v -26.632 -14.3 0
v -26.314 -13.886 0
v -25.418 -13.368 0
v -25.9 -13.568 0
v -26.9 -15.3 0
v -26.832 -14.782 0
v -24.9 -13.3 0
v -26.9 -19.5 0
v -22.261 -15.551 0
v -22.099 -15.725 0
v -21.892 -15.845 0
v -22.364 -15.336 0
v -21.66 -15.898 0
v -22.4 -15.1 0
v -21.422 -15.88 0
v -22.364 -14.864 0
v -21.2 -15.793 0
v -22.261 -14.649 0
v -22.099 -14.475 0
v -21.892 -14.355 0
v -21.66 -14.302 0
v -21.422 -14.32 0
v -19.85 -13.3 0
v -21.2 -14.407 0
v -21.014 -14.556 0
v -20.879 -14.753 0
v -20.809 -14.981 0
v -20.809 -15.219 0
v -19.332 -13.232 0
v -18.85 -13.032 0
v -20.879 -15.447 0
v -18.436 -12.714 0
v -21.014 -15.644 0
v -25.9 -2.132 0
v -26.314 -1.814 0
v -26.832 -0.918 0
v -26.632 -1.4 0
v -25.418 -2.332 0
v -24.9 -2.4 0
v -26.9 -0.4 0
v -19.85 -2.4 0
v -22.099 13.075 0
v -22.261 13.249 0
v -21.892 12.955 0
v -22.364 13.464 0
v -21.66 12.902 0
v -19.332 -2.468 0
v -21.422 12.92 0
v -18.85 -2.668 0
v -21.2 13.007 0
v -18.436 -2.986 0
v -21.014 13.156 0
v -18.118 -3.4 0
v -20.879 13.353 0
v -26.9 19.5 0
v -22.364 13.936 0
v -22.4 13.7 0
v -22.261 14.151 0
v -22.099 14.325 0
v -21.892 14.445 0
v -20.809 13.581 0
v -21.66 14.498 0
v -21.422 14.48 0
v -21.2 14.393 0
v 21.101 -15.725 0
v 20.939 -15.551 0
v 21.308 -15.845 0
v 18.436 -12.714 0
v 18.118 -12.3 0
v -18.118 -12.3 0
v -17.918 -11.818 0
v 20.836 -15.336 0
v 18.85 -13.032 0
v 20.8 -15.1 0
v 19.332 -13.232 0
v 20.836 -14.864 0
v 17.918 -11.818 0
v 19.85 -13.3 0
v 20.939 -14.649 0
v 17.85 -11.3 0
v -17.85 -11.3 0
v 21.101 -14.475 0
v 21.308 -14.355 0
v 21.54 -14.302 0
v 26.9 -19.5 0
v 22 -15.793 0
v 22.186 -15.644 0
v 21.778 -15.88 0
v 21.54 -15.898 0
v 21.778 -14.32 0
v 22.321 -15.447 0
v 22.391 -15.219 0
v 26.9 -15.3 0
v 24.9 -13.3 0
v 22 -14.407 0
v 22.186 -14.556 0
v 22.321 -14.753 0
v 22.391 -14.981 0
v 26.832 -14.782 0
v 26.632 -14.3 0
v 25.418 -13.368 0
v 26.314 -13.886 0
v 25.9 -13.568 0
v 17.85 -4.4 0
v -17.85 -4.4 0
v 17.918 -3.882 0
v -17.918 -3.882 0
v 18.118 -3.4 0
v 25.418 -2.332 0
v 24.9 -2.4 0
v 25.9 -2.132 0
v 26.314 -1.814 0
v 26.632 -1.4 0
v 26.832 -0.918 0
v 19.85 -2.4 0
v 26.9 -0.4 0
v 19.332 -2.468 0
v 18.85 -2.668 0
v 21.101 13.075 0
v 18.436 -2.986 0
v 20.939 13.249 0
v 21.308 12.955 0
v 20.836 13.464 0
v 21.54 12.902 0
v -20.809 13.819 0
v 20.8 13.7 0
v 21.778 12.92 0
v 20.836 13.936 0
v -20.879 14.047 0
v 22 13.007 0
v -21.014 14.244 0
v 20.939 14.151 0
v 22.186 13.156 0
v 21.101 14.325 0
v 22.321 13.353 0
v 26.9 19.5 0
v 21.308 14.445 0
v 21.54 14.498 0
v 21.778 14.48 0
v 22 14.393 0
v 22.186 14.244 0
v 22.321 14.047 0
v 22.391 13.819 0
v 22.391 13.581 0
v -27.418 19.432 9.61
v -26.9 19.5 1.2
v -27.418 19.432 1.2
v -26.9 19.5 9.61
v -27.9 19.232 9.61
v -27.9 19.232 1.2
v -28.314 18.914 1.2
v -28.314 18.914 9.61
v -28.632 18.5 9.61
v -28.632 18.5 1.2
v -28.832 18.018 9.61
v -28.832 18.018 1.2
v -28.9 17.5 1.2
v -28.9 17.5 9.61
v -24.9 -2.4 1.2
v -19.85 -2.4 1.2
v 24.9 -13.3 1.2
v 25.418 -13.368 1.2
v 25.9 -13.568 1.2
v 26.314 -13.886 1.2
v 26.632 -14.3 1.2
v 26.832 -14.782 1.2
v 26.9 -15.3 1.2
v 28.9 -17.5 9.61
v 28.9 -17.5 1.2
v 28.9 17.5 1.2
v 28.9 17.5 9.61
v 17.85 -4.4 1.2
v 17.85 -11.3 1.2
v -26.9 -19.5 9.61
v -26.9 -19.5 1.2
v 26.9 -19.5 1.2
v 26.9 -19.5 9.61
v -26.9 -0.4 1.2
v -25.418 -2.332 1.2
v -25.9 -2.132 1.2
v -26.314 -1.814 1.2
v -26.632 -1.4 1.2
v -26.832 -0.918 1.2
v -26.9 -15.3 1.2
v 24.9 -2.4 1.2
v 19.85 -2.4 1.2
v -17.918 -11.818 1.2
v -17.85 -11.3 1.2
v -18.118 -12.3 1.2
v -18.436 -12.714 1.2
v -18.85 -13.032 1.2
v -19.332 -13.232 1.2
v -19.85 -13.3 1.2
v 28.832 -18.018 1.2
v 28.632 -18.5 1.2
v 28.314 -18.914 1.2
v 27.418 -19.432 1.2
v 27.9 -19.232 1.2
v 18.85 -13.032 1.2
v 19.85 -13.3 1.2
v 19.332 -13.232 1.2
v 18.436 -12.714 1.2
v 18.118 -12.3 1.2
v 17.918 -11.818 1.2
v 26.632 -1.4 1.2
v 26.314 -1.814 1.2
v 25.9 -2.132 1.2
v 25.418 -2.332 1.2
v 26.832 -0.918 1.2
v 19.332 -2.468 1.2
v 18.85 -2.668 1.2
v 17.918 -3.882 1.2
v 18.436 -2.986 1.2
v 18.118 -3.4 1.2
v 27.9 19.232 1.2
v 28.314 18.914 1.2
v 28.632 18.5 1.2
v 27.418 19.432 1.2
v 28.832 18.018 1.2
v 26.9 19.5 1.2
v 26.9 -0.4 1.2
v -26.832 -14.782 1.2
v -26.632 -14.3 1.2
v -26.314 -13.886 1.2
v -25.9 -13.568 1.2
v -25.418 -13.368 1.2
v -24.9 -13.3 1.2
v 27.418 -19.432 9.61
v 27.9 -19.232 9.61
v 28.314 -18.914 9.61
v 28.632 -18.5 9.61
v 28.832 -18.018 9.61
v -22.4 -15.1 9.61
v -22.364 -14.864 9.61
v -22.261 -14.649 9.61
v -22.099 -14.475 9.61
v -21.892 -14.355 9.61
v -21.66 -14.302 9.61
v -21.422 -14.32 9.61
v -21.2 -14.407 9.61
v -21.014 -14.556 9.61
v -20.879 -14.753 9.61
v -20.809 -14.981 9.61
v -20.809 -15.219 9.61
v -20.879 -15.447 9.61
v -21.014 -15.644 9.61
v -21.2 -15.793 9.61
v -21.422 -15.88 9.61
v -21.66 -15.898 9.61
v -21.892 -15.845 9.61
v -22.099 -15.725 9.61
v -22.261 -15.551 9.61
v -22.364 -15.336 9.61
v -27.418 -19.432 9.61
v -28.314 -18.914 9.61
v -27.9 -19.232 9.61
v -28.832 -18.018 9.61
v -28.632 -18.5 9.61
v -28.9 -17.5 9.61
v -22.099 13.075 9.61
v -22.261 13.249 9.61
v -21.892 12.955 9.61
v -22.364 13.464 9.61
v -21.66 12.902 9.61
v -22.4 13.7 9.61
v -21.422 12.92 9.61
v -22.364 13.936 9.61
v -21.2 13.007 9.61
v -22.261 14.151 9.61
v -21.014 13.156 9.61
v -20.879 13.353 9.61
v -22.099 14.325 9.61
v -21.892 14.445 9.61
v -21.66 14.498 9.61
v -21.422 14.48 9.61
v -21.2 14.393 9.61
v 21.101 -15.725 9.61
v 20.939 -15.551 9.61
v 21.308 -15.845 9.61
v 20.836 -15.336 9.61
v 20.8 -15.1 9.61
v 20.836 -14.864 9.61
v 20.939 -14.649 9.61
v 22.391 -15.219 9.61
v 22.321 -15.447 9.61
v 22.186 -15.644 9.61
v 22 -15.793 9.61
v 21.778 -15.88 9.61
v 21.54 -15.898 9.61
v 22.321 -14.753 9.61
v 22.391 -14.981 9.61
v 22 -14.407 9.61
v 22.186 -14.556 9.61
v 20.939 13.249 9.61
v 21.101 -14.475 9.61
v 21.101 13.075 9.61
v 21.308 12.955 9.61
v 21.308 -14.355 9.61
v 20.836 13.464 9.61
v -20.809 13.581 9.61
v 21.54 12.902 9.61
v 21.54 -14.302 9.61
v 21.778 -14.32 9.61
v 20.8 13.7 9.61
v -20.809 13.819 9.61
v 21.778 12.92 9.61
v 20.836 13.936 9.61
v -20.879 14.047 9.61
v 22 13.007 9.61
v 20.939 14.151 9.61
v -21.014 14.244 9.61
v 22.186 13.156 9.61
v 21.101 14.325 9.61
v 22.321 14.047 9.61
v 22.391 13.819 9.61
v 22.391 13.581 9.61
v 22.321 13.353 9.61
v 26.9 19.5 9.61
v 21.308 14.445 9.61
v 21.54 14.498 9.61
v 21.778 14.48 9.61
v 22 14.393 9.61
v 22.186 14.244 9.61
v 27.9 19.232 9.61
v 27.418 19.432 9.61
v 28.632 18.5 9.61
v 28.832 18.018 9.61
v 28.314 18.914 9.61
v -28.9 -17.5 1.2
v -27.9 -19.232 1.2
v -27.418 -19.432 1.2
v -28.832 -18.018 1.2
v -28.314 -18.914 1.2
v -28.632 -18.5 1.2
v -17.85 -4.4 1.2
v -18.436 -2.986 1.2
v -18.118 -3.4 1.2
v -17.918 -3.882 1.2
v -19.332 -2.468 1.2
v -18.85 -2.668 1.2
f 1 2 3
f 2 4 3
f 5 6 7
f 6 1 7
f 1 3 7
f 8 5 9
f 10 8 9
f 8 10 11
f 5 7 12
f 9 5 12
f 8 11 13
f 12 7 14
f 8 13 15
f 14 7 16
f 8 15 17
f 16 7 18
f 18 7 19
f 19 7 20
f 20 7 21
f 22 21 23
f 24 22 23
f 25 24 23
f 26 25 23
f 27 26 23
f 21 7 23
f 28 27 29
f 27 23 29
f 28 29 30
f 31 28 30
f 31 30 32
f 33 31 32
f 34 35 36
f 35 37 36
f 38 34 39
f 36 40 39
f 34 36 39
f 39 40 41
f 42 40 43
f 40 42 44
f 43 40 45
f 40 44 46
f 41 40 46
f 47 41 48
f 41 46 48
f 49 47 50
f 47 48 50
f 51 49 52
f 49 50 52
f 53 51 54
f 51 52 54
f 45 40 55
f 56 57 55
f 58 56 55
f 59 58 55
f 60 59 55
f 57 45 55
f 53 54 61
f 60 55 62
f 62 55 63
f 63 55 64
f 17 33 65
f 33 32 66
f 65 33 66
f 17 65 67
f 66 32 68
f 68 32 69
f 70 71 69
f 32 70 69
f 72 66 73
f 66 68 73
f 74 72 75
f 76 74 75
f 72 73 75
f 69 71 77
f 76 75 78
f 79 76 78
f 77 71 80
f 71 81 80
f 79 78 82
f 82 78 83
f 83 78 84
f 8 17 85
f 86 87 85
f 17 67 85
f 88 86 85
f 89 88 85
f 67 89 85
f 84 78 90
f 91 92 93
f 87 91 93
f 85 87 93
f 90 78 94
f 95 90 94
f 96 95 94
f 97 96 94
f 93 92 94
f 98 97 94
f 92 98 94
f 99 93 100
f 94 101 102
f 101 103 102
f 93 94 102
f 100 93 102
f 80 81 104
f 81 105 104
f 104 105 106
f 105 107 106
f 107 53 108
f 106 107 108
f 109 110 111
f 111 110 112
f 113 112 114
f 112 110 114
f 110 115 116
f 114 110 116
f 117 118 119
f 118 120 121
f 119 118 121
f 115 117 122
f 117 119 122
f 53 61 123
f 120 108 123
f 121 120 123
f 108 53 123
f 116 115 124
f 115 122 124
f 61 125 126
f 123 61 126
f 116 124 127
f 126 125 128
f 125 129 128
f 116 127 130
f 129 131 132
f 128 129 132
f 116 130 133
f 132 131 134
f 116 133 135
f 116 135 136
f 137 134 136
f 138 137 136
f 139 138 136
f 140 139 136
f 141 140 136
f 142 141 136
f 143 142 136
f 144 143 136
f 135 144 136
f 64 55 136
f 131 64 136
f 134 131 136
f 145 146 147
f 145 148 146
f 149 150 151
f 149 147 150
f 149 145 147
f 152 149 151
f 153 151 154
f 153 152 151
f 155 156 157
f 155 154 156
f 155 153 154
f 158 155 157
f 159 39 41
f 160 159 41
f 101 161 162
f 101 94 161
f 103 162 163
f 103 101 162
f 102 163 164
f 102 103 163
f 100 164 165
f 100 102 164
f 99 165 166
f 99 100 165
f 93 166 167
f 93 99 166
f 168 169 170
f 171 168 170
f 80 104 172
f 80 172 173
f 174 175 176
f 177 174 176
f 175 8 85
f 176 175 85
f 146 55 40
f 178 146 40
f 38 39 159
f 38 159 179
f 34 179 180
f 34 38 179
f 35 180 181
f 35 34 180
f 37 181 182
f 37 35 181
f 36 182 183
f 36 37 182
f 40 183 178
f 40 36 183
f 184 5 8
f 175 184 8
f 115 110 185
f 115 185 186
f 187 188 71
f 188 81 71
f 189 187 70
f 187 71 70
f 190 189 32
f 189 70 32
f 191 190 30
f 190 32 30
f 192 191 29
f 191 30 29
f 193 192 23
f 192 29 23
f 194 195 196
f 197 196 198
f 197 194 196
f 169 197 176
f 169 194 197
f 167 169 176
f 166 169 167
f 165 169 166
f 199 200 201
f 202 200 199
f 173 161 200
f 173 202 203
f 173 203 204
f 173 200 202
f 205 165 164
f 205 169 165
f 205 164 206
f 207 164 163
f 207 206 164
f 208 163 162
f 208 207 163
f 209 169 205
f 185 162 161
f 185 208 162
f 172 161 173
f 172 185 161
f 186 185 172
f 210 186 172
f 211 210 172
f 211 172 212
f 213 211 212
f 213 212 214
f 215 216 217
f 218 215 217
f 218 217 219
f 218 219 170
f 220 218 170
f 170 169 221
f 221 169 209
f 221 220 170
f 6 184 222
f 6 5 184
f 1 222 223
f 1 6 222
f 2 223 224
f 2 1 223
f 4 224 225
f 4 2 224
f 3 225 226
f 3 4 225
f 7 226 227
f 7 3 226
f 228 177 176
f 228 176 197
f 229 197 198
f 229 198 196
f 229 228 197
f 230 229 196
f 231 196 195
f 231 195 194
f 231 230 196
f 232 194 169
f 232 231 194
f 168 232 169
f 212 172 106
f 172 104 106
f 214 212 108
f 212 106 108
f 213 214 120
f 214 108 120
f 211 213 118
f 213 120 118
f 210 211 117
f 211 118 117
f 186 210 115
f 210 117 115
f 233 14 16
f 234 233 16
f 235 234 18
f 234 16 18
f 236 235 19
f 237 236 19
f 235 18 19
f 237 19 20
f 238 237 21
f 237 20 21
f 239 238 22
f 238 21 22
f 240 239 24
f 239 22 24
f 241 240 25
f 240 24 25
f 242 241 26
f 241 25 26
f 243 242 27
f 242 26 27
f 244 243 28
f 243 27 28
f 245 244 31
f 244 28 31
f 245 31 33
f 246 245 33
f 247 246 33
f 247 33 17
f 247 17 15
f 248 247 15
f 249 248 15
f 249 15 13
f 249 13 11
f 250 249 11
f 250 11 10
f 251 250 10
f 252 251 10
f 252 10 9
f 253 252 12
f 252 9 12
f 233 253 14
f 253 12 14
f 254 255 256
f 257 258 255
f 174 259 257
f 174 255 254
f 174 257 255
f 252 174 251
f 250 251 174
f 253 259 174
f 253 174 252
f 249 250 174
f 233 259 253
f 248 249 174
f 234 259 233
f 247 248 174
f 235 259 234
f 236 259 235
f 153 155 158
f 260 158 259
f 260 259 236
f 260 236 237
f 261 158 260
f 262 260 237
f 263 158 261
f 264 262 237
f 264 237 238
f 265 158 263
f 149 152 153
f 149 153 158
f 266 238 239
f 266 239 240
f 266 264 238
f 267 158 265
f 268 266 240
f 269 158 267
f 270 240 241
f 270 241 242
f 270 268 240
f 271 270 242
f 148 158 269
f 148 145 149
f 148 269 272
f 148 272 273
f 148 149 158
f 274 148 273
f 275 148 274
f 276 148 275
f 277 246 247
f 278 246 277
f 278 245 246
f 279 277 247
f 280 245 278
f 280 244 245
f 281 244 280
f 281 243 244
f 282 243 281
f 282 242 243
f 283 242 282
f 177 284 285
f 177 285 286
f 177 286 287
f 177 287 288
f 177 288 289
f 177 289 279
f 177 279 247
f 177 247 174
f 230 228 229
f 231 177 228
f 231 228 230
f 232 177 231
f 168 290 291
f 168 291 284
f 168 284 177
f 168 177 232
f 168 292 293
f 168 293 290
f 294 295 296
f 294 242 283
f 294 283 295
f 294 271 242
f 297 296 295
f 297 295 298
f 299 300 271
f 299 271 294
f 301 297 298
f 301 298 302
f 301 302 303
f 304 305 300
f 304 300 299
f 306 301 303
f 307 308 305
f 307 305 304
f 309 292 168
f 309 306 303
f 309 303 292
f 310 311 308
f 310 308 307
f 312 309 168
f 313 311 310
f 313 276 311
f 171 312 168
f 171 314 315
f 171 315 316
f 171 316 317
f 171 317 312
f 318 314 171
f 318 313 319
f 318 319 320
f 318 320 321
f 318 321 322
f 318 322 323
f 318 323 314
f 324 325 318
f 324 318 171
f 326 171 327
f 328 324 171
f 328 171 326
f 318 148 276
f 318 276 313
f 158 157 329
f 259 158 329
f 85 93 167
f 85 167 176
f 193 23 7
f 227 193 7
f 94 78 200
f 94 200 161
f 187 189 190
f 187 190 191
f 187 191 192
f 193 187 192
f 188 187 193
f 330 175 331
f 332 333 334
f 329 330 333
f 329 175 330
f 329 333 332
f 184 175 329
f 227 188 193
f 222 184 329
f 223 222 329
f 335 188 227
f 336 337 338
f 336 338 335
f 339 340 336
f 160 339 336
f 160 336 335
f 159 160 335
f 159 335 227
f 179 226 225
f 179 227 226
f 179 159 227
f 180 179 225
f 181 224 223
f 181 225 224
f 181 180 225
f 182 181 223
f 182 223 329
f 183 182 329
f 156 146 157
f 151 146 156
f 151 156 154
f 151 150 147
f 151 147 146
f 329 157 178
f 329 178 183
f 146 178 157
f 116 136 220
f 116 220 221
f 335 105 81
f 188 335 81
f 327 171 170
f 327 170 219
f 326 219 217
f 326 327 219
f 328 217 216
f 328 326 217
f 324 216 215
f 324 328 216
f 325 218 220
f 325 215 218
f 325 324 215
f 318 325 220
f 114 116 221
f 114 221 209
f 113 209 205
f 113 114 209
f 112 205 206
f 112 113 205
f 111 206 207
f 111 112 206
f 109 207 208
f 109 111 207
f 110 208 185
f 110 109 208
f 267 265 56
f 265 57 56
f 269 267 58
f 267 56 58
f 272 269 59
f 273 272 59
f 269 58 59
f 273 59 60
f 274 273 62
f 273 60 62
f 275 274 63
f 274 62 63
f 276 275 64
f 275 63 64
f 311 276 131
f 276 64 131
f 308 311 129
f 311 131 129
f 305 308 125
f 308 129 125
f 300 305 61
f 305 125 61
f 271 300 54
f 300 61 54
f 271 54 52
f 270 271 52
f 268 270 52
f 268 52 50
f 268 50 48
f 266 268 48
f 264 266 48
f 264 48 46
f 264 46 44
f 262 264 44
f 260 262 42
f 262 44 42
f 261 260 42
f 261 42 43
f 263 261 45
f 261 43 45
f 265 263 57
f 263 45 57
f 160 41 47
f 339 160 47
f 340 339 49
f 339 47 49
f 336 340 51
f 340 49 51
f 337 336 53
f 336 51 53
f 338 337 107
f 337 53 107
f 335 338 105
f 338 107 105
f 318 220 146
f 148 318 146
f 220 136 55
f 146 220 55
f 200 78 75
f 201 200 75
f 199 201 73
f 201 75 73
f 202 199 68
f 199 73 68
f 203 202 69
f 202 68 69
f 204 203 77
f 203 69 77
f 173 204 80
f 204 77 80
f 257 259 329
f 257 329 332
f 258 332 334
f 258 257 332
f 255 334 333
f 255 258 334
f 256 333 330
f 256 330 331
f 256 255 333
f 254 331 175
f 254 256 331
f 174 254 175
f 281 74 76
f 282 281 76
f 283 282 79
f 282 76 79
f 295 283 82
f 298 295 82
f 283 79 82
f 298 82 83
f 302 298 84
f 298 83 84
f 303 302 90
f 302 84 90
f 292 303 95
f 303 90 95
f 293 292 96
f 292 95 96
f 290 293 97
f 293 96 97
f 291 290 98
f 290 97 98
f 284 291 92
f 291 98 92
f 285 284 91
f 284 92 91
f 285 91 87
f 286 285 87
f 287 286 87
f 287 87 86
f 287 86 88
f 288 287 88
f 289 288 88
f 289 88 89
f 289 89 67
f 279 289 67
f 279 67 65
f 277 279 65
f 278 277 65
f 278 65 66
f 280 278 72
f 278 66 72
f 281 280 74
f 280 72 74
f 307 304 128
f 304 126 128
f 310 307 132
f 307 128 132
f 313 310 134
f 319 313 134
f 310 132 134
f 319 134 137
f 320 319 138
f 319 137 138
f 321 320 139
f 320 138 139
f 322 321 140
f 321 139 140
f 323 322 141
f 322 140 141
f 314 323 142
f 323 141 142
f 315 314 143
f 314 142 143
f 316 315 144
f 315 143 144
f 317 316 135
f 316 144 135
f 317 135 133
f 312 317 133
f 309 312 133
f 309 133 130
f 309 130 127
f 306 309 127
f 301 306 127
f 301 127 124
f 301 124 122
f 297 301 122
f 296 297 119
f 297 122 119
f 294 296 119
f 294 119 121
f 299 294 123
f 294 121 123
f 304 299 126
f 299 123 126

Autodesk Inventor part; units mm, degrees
ref_plane "YZ Plane" through (0, 0, 0) normal (1, 0, 0) x (0, 1, 0)
ref_plane "XZ Plane" through (0, 0, 0) normal (0, 1, 0) x (-1, 0, 0)
ref_plane "XY Plane" through (0, 0, 0) normal (0, 0, 1) x (1, 0, 0)
sketch "Sketch1" plane through (0, 0, 0) normal (0, 0, 1) x (1, 0, 0)
  line L0 (-28.9, -19.5) -> (28.9, -19.5)
  line L1 (28.9, -19.5) -> (28.9, 19.5)
  line L2 (28.9, 19.5) -> (-28.9, 19.5)
  line L3 (-28.9, 19.5) -> (-28.9, -19.5)
  line L4 (-28.9, -19.5) -> (28.9, 19.5) construction
  line L5 (28.9, -19.5) -> (-28.9, 19.5) construction
  point P0 (0, 0)
  dimension "d0" = 57.8
  dimension "d1" = 39
extrude "Extrusion1" add sketch "Sketch1" along normal blind 9.61
sketch "Sketch2" plane through (0, 0, 0) normal (0, 0, -1) x (-1, 0, 0)
  circle A0 centre (-21.6, -15.1) radius 0.8
  line L0 (55.7735, 0) -> (-51.4211, 0) construction
  line L1 (0, -27.3) -> (0, 27.3) construction
  line L2 (28.9, -19.5) -> (-28.9, -19.5) projected
  line L3 (-28.9, -19.5) -> (-28.9, 19.5) projected
  circle A1 centre (21.6, -15.1) radius 0.8
  line L4 (-36.1076, -0.7) -> (40.46, -0.7) construction
  circle A2 centre (-21.6, 13.7) radius 0.8
  circle A3 centre (21.6, 13.7) radius 0.8
  line L5 (-28.9, 19.5) -> (28.9, 19.5) projected
  point P0 (0, 0)
  dimension "d4" = 1.6
  dimension "d5" = 4.4
  dimension "d6" = 7.3
  dimension "d7" = 5.8
extrude "Extrusion2" cut sketch "Sketch2" against normal through all
sketch "Sketch3" plane through (0, 0, 0) normal (0, 0, -1) x (-1, 0, 0)
  line L0 (-28.9, 19.5) -> (28.9, 19.5) construction
  line L1 (28.9, -19.5) -> (-28.9, -19.5) construction
  line L2 (-28.9, -19.5) -> (-28.9, 19.5) projected
  line L3 (-26.9, 19.5) -> (-26.9, -0.4)
  line L4 (-24.9, -2.4) -> (-19.85, -2.4)
  line L5 (-17.85, -4.4) -> (-17.85, -11.3)
  line L6 (-19.85, -13.3) -> (-24.9, -13.3)
  line L7 (-26.9, -15.3) -> (-26.9, -19.5)
  line L8 (-28.9, 19.5) -> (28.9, 19.5) projected
  line L9 (-26.9, 19.5) -> (-28.9, 19.5)
  line L10 (-28.9, 19.5) -> (-28.9, -19.5)
  arc A0 (-26.9, -0.4) -> (-24.9, -2.4) centre (-24.9, -0.4) ccw
  arc A1 (-17.85, -4.4) -> (-19.85, -2.4) centre (-19.85, -4.4) ccw
  arc A2 (-19.85, -13.3) -> (-17.85, -11.3) centre (-19.85, -11.3) ccw
  arc A3 (-24.9, -13.3) -> (-26.9, -15.3) centre (-24.9, -15.3) ccw
  line L11 (-28.9, 19.5) -> (-26.9, 19.5)
  line L12 (-28.9, -19.5) -> (-28.9, 19.5) projected
  line L13 (-28.9, -19.5) -> (-26.9, -19.5)
  line L14 (0, -27.3) -> (0, 27.3) projected
  line L15 (28.9, -19.5) -> (28.9, 19.5)
  line L16 (26.9, 19.5) -> (26.9, -0.4)
  line L17 (24.9, -2.4) -> (19.85, -2.4)
  line L18 (17.85, -4.4) -> (17.85, -11.3)
  line L19 (19.85, -13.3) -> (24.9, -13.3)
  line L20 (26.9, -15.3) -> (26.9, -19.5)
  line L21 (26.9, 19.5) -> (28.9, 19.5)
  line L22 (28.9, 19.5) -> (28.9, -19.5)
  arc A4 (24.9, -2.4) -> (26.9, -0.4) centre (24.9, -0.4) ccw
  arc A5 (19.85, -2.4) -> (17.85, -4.4) centre (19.85, -4.4) ccw
  arc A6 (17.85, -11.3) -> (19.85, -13.3) centre (19.85, -11.3) ccw
  arc A7 (26.9, -15.3) -> (24.9, -13.3) centre (24.9, -15.3) ccw
  line L23 (28.9, 19.5) -> (26.9, 19.5)
  line L24 (28.9, -19.5) -> (28.9, 19.5)
  line L25 (28.9, -19.5) -> (26.9, -19.5)
  point P0 (0, 0)
  point P1 (-26.9, -13.3)
  point P2 (26.9, -13.3)
  dimension "d10" = 6.2
  dimension "d11" = 21.9
  dimension "d12" = 11.05
  dimension "d13" = 2
  dimension "d14" = 2
extrude "Extrusion3" cut sketch "Sketch3" against normal blind 1.2
fillet "Fillet1" radius 2 4 edges at (-28.9, 19.5, 5.405) (28.9, 19.5, 5.405) (28.9, -19.5, 5.405) (-28.9, -19.5, 5.405)
properties part number "ThermalConductivityBlock_NX"
